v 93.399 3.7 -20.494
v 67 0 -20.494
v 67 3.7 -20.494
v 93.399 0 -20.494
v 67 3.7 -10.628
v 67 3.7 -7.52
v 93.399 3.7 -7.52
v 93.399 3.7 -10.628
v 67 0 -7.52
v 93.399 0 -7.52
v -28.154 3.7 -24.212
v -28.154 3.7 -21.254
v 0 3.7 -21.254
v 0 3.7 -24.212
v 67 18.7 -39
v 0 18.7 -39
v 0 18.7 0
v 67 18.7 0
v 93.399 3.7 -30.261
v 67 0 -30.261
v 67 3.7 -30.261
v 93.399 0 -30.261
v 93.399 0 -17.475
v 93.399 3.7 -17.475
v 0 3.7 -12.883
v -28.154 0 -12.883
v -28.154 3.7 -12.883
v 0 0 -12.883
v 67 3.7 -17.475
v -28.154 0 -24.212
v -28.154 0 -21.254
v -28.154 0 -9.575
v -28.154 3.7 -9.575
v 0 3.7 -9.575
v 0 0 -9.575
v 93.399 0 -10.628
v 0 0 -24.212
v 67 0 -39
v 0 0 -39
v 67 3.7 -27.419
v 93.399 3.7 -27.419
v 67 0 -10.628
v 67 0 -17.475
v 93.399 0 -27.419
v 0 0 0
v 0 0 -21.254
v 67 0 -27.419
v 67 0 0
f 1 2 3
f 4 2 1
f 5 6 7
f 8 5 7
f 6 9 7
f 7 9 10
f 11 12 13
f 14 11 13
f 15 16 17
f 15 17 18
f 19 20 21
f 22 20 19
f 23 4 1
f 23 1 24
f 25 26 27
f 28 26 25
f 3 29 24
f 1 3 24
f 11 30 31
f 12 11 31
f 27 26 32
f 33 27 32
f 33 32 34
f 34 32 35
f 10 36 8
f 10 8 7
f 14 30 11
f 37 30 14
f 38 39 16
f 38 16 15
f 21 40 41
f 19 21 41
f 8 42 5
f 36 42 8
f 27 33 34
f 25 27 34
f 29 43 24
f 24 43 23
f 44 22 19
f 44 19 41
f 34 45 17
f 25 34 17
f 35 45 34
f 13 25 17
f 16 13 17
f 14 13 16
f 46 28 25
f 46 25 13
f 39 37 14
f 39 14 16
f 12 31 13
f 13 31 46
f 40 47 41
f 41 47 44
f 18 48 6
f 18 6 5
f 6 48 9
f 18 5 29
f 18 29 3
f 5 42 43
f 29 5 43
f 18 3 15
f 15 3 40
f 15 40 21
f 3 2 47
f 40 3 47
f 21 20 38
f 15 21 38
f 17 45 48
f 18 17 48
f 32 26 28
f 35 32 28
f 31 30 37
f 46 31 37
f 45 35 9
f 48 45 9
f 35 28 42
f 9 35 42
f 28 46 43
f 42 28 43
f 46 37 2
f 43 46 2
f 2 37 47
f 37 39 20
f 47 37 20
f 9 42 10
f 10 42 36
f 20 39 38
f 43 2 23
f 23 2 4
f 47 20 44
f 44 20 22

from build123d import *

# Parameters (mm, degrees)
SKETCH1_W           = 67
SKETCH1_H           = 39
BOSS_EXTRUDE1_DEPTH = 18.7
SKETCH2_W           = 28.153869909
SKETCH2_H           = 3.308256434
SKETCH2_H_2         = 2.957380752
SKETCH2_W_2         = 26.399491497
SKETCH2_H_3         = 3.107756044
SKETCH2_H_4         = 3.018867182
SKETCH2_H_5         = 2.841286759
BOSS_EXTRUDE2_DEPTH = 3.7


with BuildPart() as part:
    # Sketch1 → Boss-Extrude1 (new body)
    with BuildSketch(Plane(origin=(0, 0, 0), x_dir=(1, 0, 0), z_dir=(0, 1, 0))):
        with Locations((33.5, 19.5)):
            Rectangle(SKETCH1_W, SKETCH1_H)
    extrude(amount=BOSS_EXTRUDE1_DEPTH)

    # Sketch2 → Boss-Extrude2 (add)
    with BuildSketch(Plane.XZ):
        with Locations((-14.076934955, -11.229358915)):
            Rectangle(SKETCH2_W, SKETCH2_H)
        with Locations((-14.076934955, -22.733068788)):
            Rectangle(SKETCH2_W, SKETCH2_H_2)
        with Locations((80.199745748, -9.073979723)):
            Rectangle(SKETCH2_W_2, SKETCH2_H_3)
        with Locations((80.199745748, -18.984327025)):
            Rectangle(SKETCH2_W_2, SKETCH2_H_4)
        with Locations((80.199745748, -28.84004047)):
            Rectangle(SKETCH2_W_2, SKETCH2_H_5)
    extrude(amount=-BOSS_EXTRUDE2_DEPTH)


solid = part.part
